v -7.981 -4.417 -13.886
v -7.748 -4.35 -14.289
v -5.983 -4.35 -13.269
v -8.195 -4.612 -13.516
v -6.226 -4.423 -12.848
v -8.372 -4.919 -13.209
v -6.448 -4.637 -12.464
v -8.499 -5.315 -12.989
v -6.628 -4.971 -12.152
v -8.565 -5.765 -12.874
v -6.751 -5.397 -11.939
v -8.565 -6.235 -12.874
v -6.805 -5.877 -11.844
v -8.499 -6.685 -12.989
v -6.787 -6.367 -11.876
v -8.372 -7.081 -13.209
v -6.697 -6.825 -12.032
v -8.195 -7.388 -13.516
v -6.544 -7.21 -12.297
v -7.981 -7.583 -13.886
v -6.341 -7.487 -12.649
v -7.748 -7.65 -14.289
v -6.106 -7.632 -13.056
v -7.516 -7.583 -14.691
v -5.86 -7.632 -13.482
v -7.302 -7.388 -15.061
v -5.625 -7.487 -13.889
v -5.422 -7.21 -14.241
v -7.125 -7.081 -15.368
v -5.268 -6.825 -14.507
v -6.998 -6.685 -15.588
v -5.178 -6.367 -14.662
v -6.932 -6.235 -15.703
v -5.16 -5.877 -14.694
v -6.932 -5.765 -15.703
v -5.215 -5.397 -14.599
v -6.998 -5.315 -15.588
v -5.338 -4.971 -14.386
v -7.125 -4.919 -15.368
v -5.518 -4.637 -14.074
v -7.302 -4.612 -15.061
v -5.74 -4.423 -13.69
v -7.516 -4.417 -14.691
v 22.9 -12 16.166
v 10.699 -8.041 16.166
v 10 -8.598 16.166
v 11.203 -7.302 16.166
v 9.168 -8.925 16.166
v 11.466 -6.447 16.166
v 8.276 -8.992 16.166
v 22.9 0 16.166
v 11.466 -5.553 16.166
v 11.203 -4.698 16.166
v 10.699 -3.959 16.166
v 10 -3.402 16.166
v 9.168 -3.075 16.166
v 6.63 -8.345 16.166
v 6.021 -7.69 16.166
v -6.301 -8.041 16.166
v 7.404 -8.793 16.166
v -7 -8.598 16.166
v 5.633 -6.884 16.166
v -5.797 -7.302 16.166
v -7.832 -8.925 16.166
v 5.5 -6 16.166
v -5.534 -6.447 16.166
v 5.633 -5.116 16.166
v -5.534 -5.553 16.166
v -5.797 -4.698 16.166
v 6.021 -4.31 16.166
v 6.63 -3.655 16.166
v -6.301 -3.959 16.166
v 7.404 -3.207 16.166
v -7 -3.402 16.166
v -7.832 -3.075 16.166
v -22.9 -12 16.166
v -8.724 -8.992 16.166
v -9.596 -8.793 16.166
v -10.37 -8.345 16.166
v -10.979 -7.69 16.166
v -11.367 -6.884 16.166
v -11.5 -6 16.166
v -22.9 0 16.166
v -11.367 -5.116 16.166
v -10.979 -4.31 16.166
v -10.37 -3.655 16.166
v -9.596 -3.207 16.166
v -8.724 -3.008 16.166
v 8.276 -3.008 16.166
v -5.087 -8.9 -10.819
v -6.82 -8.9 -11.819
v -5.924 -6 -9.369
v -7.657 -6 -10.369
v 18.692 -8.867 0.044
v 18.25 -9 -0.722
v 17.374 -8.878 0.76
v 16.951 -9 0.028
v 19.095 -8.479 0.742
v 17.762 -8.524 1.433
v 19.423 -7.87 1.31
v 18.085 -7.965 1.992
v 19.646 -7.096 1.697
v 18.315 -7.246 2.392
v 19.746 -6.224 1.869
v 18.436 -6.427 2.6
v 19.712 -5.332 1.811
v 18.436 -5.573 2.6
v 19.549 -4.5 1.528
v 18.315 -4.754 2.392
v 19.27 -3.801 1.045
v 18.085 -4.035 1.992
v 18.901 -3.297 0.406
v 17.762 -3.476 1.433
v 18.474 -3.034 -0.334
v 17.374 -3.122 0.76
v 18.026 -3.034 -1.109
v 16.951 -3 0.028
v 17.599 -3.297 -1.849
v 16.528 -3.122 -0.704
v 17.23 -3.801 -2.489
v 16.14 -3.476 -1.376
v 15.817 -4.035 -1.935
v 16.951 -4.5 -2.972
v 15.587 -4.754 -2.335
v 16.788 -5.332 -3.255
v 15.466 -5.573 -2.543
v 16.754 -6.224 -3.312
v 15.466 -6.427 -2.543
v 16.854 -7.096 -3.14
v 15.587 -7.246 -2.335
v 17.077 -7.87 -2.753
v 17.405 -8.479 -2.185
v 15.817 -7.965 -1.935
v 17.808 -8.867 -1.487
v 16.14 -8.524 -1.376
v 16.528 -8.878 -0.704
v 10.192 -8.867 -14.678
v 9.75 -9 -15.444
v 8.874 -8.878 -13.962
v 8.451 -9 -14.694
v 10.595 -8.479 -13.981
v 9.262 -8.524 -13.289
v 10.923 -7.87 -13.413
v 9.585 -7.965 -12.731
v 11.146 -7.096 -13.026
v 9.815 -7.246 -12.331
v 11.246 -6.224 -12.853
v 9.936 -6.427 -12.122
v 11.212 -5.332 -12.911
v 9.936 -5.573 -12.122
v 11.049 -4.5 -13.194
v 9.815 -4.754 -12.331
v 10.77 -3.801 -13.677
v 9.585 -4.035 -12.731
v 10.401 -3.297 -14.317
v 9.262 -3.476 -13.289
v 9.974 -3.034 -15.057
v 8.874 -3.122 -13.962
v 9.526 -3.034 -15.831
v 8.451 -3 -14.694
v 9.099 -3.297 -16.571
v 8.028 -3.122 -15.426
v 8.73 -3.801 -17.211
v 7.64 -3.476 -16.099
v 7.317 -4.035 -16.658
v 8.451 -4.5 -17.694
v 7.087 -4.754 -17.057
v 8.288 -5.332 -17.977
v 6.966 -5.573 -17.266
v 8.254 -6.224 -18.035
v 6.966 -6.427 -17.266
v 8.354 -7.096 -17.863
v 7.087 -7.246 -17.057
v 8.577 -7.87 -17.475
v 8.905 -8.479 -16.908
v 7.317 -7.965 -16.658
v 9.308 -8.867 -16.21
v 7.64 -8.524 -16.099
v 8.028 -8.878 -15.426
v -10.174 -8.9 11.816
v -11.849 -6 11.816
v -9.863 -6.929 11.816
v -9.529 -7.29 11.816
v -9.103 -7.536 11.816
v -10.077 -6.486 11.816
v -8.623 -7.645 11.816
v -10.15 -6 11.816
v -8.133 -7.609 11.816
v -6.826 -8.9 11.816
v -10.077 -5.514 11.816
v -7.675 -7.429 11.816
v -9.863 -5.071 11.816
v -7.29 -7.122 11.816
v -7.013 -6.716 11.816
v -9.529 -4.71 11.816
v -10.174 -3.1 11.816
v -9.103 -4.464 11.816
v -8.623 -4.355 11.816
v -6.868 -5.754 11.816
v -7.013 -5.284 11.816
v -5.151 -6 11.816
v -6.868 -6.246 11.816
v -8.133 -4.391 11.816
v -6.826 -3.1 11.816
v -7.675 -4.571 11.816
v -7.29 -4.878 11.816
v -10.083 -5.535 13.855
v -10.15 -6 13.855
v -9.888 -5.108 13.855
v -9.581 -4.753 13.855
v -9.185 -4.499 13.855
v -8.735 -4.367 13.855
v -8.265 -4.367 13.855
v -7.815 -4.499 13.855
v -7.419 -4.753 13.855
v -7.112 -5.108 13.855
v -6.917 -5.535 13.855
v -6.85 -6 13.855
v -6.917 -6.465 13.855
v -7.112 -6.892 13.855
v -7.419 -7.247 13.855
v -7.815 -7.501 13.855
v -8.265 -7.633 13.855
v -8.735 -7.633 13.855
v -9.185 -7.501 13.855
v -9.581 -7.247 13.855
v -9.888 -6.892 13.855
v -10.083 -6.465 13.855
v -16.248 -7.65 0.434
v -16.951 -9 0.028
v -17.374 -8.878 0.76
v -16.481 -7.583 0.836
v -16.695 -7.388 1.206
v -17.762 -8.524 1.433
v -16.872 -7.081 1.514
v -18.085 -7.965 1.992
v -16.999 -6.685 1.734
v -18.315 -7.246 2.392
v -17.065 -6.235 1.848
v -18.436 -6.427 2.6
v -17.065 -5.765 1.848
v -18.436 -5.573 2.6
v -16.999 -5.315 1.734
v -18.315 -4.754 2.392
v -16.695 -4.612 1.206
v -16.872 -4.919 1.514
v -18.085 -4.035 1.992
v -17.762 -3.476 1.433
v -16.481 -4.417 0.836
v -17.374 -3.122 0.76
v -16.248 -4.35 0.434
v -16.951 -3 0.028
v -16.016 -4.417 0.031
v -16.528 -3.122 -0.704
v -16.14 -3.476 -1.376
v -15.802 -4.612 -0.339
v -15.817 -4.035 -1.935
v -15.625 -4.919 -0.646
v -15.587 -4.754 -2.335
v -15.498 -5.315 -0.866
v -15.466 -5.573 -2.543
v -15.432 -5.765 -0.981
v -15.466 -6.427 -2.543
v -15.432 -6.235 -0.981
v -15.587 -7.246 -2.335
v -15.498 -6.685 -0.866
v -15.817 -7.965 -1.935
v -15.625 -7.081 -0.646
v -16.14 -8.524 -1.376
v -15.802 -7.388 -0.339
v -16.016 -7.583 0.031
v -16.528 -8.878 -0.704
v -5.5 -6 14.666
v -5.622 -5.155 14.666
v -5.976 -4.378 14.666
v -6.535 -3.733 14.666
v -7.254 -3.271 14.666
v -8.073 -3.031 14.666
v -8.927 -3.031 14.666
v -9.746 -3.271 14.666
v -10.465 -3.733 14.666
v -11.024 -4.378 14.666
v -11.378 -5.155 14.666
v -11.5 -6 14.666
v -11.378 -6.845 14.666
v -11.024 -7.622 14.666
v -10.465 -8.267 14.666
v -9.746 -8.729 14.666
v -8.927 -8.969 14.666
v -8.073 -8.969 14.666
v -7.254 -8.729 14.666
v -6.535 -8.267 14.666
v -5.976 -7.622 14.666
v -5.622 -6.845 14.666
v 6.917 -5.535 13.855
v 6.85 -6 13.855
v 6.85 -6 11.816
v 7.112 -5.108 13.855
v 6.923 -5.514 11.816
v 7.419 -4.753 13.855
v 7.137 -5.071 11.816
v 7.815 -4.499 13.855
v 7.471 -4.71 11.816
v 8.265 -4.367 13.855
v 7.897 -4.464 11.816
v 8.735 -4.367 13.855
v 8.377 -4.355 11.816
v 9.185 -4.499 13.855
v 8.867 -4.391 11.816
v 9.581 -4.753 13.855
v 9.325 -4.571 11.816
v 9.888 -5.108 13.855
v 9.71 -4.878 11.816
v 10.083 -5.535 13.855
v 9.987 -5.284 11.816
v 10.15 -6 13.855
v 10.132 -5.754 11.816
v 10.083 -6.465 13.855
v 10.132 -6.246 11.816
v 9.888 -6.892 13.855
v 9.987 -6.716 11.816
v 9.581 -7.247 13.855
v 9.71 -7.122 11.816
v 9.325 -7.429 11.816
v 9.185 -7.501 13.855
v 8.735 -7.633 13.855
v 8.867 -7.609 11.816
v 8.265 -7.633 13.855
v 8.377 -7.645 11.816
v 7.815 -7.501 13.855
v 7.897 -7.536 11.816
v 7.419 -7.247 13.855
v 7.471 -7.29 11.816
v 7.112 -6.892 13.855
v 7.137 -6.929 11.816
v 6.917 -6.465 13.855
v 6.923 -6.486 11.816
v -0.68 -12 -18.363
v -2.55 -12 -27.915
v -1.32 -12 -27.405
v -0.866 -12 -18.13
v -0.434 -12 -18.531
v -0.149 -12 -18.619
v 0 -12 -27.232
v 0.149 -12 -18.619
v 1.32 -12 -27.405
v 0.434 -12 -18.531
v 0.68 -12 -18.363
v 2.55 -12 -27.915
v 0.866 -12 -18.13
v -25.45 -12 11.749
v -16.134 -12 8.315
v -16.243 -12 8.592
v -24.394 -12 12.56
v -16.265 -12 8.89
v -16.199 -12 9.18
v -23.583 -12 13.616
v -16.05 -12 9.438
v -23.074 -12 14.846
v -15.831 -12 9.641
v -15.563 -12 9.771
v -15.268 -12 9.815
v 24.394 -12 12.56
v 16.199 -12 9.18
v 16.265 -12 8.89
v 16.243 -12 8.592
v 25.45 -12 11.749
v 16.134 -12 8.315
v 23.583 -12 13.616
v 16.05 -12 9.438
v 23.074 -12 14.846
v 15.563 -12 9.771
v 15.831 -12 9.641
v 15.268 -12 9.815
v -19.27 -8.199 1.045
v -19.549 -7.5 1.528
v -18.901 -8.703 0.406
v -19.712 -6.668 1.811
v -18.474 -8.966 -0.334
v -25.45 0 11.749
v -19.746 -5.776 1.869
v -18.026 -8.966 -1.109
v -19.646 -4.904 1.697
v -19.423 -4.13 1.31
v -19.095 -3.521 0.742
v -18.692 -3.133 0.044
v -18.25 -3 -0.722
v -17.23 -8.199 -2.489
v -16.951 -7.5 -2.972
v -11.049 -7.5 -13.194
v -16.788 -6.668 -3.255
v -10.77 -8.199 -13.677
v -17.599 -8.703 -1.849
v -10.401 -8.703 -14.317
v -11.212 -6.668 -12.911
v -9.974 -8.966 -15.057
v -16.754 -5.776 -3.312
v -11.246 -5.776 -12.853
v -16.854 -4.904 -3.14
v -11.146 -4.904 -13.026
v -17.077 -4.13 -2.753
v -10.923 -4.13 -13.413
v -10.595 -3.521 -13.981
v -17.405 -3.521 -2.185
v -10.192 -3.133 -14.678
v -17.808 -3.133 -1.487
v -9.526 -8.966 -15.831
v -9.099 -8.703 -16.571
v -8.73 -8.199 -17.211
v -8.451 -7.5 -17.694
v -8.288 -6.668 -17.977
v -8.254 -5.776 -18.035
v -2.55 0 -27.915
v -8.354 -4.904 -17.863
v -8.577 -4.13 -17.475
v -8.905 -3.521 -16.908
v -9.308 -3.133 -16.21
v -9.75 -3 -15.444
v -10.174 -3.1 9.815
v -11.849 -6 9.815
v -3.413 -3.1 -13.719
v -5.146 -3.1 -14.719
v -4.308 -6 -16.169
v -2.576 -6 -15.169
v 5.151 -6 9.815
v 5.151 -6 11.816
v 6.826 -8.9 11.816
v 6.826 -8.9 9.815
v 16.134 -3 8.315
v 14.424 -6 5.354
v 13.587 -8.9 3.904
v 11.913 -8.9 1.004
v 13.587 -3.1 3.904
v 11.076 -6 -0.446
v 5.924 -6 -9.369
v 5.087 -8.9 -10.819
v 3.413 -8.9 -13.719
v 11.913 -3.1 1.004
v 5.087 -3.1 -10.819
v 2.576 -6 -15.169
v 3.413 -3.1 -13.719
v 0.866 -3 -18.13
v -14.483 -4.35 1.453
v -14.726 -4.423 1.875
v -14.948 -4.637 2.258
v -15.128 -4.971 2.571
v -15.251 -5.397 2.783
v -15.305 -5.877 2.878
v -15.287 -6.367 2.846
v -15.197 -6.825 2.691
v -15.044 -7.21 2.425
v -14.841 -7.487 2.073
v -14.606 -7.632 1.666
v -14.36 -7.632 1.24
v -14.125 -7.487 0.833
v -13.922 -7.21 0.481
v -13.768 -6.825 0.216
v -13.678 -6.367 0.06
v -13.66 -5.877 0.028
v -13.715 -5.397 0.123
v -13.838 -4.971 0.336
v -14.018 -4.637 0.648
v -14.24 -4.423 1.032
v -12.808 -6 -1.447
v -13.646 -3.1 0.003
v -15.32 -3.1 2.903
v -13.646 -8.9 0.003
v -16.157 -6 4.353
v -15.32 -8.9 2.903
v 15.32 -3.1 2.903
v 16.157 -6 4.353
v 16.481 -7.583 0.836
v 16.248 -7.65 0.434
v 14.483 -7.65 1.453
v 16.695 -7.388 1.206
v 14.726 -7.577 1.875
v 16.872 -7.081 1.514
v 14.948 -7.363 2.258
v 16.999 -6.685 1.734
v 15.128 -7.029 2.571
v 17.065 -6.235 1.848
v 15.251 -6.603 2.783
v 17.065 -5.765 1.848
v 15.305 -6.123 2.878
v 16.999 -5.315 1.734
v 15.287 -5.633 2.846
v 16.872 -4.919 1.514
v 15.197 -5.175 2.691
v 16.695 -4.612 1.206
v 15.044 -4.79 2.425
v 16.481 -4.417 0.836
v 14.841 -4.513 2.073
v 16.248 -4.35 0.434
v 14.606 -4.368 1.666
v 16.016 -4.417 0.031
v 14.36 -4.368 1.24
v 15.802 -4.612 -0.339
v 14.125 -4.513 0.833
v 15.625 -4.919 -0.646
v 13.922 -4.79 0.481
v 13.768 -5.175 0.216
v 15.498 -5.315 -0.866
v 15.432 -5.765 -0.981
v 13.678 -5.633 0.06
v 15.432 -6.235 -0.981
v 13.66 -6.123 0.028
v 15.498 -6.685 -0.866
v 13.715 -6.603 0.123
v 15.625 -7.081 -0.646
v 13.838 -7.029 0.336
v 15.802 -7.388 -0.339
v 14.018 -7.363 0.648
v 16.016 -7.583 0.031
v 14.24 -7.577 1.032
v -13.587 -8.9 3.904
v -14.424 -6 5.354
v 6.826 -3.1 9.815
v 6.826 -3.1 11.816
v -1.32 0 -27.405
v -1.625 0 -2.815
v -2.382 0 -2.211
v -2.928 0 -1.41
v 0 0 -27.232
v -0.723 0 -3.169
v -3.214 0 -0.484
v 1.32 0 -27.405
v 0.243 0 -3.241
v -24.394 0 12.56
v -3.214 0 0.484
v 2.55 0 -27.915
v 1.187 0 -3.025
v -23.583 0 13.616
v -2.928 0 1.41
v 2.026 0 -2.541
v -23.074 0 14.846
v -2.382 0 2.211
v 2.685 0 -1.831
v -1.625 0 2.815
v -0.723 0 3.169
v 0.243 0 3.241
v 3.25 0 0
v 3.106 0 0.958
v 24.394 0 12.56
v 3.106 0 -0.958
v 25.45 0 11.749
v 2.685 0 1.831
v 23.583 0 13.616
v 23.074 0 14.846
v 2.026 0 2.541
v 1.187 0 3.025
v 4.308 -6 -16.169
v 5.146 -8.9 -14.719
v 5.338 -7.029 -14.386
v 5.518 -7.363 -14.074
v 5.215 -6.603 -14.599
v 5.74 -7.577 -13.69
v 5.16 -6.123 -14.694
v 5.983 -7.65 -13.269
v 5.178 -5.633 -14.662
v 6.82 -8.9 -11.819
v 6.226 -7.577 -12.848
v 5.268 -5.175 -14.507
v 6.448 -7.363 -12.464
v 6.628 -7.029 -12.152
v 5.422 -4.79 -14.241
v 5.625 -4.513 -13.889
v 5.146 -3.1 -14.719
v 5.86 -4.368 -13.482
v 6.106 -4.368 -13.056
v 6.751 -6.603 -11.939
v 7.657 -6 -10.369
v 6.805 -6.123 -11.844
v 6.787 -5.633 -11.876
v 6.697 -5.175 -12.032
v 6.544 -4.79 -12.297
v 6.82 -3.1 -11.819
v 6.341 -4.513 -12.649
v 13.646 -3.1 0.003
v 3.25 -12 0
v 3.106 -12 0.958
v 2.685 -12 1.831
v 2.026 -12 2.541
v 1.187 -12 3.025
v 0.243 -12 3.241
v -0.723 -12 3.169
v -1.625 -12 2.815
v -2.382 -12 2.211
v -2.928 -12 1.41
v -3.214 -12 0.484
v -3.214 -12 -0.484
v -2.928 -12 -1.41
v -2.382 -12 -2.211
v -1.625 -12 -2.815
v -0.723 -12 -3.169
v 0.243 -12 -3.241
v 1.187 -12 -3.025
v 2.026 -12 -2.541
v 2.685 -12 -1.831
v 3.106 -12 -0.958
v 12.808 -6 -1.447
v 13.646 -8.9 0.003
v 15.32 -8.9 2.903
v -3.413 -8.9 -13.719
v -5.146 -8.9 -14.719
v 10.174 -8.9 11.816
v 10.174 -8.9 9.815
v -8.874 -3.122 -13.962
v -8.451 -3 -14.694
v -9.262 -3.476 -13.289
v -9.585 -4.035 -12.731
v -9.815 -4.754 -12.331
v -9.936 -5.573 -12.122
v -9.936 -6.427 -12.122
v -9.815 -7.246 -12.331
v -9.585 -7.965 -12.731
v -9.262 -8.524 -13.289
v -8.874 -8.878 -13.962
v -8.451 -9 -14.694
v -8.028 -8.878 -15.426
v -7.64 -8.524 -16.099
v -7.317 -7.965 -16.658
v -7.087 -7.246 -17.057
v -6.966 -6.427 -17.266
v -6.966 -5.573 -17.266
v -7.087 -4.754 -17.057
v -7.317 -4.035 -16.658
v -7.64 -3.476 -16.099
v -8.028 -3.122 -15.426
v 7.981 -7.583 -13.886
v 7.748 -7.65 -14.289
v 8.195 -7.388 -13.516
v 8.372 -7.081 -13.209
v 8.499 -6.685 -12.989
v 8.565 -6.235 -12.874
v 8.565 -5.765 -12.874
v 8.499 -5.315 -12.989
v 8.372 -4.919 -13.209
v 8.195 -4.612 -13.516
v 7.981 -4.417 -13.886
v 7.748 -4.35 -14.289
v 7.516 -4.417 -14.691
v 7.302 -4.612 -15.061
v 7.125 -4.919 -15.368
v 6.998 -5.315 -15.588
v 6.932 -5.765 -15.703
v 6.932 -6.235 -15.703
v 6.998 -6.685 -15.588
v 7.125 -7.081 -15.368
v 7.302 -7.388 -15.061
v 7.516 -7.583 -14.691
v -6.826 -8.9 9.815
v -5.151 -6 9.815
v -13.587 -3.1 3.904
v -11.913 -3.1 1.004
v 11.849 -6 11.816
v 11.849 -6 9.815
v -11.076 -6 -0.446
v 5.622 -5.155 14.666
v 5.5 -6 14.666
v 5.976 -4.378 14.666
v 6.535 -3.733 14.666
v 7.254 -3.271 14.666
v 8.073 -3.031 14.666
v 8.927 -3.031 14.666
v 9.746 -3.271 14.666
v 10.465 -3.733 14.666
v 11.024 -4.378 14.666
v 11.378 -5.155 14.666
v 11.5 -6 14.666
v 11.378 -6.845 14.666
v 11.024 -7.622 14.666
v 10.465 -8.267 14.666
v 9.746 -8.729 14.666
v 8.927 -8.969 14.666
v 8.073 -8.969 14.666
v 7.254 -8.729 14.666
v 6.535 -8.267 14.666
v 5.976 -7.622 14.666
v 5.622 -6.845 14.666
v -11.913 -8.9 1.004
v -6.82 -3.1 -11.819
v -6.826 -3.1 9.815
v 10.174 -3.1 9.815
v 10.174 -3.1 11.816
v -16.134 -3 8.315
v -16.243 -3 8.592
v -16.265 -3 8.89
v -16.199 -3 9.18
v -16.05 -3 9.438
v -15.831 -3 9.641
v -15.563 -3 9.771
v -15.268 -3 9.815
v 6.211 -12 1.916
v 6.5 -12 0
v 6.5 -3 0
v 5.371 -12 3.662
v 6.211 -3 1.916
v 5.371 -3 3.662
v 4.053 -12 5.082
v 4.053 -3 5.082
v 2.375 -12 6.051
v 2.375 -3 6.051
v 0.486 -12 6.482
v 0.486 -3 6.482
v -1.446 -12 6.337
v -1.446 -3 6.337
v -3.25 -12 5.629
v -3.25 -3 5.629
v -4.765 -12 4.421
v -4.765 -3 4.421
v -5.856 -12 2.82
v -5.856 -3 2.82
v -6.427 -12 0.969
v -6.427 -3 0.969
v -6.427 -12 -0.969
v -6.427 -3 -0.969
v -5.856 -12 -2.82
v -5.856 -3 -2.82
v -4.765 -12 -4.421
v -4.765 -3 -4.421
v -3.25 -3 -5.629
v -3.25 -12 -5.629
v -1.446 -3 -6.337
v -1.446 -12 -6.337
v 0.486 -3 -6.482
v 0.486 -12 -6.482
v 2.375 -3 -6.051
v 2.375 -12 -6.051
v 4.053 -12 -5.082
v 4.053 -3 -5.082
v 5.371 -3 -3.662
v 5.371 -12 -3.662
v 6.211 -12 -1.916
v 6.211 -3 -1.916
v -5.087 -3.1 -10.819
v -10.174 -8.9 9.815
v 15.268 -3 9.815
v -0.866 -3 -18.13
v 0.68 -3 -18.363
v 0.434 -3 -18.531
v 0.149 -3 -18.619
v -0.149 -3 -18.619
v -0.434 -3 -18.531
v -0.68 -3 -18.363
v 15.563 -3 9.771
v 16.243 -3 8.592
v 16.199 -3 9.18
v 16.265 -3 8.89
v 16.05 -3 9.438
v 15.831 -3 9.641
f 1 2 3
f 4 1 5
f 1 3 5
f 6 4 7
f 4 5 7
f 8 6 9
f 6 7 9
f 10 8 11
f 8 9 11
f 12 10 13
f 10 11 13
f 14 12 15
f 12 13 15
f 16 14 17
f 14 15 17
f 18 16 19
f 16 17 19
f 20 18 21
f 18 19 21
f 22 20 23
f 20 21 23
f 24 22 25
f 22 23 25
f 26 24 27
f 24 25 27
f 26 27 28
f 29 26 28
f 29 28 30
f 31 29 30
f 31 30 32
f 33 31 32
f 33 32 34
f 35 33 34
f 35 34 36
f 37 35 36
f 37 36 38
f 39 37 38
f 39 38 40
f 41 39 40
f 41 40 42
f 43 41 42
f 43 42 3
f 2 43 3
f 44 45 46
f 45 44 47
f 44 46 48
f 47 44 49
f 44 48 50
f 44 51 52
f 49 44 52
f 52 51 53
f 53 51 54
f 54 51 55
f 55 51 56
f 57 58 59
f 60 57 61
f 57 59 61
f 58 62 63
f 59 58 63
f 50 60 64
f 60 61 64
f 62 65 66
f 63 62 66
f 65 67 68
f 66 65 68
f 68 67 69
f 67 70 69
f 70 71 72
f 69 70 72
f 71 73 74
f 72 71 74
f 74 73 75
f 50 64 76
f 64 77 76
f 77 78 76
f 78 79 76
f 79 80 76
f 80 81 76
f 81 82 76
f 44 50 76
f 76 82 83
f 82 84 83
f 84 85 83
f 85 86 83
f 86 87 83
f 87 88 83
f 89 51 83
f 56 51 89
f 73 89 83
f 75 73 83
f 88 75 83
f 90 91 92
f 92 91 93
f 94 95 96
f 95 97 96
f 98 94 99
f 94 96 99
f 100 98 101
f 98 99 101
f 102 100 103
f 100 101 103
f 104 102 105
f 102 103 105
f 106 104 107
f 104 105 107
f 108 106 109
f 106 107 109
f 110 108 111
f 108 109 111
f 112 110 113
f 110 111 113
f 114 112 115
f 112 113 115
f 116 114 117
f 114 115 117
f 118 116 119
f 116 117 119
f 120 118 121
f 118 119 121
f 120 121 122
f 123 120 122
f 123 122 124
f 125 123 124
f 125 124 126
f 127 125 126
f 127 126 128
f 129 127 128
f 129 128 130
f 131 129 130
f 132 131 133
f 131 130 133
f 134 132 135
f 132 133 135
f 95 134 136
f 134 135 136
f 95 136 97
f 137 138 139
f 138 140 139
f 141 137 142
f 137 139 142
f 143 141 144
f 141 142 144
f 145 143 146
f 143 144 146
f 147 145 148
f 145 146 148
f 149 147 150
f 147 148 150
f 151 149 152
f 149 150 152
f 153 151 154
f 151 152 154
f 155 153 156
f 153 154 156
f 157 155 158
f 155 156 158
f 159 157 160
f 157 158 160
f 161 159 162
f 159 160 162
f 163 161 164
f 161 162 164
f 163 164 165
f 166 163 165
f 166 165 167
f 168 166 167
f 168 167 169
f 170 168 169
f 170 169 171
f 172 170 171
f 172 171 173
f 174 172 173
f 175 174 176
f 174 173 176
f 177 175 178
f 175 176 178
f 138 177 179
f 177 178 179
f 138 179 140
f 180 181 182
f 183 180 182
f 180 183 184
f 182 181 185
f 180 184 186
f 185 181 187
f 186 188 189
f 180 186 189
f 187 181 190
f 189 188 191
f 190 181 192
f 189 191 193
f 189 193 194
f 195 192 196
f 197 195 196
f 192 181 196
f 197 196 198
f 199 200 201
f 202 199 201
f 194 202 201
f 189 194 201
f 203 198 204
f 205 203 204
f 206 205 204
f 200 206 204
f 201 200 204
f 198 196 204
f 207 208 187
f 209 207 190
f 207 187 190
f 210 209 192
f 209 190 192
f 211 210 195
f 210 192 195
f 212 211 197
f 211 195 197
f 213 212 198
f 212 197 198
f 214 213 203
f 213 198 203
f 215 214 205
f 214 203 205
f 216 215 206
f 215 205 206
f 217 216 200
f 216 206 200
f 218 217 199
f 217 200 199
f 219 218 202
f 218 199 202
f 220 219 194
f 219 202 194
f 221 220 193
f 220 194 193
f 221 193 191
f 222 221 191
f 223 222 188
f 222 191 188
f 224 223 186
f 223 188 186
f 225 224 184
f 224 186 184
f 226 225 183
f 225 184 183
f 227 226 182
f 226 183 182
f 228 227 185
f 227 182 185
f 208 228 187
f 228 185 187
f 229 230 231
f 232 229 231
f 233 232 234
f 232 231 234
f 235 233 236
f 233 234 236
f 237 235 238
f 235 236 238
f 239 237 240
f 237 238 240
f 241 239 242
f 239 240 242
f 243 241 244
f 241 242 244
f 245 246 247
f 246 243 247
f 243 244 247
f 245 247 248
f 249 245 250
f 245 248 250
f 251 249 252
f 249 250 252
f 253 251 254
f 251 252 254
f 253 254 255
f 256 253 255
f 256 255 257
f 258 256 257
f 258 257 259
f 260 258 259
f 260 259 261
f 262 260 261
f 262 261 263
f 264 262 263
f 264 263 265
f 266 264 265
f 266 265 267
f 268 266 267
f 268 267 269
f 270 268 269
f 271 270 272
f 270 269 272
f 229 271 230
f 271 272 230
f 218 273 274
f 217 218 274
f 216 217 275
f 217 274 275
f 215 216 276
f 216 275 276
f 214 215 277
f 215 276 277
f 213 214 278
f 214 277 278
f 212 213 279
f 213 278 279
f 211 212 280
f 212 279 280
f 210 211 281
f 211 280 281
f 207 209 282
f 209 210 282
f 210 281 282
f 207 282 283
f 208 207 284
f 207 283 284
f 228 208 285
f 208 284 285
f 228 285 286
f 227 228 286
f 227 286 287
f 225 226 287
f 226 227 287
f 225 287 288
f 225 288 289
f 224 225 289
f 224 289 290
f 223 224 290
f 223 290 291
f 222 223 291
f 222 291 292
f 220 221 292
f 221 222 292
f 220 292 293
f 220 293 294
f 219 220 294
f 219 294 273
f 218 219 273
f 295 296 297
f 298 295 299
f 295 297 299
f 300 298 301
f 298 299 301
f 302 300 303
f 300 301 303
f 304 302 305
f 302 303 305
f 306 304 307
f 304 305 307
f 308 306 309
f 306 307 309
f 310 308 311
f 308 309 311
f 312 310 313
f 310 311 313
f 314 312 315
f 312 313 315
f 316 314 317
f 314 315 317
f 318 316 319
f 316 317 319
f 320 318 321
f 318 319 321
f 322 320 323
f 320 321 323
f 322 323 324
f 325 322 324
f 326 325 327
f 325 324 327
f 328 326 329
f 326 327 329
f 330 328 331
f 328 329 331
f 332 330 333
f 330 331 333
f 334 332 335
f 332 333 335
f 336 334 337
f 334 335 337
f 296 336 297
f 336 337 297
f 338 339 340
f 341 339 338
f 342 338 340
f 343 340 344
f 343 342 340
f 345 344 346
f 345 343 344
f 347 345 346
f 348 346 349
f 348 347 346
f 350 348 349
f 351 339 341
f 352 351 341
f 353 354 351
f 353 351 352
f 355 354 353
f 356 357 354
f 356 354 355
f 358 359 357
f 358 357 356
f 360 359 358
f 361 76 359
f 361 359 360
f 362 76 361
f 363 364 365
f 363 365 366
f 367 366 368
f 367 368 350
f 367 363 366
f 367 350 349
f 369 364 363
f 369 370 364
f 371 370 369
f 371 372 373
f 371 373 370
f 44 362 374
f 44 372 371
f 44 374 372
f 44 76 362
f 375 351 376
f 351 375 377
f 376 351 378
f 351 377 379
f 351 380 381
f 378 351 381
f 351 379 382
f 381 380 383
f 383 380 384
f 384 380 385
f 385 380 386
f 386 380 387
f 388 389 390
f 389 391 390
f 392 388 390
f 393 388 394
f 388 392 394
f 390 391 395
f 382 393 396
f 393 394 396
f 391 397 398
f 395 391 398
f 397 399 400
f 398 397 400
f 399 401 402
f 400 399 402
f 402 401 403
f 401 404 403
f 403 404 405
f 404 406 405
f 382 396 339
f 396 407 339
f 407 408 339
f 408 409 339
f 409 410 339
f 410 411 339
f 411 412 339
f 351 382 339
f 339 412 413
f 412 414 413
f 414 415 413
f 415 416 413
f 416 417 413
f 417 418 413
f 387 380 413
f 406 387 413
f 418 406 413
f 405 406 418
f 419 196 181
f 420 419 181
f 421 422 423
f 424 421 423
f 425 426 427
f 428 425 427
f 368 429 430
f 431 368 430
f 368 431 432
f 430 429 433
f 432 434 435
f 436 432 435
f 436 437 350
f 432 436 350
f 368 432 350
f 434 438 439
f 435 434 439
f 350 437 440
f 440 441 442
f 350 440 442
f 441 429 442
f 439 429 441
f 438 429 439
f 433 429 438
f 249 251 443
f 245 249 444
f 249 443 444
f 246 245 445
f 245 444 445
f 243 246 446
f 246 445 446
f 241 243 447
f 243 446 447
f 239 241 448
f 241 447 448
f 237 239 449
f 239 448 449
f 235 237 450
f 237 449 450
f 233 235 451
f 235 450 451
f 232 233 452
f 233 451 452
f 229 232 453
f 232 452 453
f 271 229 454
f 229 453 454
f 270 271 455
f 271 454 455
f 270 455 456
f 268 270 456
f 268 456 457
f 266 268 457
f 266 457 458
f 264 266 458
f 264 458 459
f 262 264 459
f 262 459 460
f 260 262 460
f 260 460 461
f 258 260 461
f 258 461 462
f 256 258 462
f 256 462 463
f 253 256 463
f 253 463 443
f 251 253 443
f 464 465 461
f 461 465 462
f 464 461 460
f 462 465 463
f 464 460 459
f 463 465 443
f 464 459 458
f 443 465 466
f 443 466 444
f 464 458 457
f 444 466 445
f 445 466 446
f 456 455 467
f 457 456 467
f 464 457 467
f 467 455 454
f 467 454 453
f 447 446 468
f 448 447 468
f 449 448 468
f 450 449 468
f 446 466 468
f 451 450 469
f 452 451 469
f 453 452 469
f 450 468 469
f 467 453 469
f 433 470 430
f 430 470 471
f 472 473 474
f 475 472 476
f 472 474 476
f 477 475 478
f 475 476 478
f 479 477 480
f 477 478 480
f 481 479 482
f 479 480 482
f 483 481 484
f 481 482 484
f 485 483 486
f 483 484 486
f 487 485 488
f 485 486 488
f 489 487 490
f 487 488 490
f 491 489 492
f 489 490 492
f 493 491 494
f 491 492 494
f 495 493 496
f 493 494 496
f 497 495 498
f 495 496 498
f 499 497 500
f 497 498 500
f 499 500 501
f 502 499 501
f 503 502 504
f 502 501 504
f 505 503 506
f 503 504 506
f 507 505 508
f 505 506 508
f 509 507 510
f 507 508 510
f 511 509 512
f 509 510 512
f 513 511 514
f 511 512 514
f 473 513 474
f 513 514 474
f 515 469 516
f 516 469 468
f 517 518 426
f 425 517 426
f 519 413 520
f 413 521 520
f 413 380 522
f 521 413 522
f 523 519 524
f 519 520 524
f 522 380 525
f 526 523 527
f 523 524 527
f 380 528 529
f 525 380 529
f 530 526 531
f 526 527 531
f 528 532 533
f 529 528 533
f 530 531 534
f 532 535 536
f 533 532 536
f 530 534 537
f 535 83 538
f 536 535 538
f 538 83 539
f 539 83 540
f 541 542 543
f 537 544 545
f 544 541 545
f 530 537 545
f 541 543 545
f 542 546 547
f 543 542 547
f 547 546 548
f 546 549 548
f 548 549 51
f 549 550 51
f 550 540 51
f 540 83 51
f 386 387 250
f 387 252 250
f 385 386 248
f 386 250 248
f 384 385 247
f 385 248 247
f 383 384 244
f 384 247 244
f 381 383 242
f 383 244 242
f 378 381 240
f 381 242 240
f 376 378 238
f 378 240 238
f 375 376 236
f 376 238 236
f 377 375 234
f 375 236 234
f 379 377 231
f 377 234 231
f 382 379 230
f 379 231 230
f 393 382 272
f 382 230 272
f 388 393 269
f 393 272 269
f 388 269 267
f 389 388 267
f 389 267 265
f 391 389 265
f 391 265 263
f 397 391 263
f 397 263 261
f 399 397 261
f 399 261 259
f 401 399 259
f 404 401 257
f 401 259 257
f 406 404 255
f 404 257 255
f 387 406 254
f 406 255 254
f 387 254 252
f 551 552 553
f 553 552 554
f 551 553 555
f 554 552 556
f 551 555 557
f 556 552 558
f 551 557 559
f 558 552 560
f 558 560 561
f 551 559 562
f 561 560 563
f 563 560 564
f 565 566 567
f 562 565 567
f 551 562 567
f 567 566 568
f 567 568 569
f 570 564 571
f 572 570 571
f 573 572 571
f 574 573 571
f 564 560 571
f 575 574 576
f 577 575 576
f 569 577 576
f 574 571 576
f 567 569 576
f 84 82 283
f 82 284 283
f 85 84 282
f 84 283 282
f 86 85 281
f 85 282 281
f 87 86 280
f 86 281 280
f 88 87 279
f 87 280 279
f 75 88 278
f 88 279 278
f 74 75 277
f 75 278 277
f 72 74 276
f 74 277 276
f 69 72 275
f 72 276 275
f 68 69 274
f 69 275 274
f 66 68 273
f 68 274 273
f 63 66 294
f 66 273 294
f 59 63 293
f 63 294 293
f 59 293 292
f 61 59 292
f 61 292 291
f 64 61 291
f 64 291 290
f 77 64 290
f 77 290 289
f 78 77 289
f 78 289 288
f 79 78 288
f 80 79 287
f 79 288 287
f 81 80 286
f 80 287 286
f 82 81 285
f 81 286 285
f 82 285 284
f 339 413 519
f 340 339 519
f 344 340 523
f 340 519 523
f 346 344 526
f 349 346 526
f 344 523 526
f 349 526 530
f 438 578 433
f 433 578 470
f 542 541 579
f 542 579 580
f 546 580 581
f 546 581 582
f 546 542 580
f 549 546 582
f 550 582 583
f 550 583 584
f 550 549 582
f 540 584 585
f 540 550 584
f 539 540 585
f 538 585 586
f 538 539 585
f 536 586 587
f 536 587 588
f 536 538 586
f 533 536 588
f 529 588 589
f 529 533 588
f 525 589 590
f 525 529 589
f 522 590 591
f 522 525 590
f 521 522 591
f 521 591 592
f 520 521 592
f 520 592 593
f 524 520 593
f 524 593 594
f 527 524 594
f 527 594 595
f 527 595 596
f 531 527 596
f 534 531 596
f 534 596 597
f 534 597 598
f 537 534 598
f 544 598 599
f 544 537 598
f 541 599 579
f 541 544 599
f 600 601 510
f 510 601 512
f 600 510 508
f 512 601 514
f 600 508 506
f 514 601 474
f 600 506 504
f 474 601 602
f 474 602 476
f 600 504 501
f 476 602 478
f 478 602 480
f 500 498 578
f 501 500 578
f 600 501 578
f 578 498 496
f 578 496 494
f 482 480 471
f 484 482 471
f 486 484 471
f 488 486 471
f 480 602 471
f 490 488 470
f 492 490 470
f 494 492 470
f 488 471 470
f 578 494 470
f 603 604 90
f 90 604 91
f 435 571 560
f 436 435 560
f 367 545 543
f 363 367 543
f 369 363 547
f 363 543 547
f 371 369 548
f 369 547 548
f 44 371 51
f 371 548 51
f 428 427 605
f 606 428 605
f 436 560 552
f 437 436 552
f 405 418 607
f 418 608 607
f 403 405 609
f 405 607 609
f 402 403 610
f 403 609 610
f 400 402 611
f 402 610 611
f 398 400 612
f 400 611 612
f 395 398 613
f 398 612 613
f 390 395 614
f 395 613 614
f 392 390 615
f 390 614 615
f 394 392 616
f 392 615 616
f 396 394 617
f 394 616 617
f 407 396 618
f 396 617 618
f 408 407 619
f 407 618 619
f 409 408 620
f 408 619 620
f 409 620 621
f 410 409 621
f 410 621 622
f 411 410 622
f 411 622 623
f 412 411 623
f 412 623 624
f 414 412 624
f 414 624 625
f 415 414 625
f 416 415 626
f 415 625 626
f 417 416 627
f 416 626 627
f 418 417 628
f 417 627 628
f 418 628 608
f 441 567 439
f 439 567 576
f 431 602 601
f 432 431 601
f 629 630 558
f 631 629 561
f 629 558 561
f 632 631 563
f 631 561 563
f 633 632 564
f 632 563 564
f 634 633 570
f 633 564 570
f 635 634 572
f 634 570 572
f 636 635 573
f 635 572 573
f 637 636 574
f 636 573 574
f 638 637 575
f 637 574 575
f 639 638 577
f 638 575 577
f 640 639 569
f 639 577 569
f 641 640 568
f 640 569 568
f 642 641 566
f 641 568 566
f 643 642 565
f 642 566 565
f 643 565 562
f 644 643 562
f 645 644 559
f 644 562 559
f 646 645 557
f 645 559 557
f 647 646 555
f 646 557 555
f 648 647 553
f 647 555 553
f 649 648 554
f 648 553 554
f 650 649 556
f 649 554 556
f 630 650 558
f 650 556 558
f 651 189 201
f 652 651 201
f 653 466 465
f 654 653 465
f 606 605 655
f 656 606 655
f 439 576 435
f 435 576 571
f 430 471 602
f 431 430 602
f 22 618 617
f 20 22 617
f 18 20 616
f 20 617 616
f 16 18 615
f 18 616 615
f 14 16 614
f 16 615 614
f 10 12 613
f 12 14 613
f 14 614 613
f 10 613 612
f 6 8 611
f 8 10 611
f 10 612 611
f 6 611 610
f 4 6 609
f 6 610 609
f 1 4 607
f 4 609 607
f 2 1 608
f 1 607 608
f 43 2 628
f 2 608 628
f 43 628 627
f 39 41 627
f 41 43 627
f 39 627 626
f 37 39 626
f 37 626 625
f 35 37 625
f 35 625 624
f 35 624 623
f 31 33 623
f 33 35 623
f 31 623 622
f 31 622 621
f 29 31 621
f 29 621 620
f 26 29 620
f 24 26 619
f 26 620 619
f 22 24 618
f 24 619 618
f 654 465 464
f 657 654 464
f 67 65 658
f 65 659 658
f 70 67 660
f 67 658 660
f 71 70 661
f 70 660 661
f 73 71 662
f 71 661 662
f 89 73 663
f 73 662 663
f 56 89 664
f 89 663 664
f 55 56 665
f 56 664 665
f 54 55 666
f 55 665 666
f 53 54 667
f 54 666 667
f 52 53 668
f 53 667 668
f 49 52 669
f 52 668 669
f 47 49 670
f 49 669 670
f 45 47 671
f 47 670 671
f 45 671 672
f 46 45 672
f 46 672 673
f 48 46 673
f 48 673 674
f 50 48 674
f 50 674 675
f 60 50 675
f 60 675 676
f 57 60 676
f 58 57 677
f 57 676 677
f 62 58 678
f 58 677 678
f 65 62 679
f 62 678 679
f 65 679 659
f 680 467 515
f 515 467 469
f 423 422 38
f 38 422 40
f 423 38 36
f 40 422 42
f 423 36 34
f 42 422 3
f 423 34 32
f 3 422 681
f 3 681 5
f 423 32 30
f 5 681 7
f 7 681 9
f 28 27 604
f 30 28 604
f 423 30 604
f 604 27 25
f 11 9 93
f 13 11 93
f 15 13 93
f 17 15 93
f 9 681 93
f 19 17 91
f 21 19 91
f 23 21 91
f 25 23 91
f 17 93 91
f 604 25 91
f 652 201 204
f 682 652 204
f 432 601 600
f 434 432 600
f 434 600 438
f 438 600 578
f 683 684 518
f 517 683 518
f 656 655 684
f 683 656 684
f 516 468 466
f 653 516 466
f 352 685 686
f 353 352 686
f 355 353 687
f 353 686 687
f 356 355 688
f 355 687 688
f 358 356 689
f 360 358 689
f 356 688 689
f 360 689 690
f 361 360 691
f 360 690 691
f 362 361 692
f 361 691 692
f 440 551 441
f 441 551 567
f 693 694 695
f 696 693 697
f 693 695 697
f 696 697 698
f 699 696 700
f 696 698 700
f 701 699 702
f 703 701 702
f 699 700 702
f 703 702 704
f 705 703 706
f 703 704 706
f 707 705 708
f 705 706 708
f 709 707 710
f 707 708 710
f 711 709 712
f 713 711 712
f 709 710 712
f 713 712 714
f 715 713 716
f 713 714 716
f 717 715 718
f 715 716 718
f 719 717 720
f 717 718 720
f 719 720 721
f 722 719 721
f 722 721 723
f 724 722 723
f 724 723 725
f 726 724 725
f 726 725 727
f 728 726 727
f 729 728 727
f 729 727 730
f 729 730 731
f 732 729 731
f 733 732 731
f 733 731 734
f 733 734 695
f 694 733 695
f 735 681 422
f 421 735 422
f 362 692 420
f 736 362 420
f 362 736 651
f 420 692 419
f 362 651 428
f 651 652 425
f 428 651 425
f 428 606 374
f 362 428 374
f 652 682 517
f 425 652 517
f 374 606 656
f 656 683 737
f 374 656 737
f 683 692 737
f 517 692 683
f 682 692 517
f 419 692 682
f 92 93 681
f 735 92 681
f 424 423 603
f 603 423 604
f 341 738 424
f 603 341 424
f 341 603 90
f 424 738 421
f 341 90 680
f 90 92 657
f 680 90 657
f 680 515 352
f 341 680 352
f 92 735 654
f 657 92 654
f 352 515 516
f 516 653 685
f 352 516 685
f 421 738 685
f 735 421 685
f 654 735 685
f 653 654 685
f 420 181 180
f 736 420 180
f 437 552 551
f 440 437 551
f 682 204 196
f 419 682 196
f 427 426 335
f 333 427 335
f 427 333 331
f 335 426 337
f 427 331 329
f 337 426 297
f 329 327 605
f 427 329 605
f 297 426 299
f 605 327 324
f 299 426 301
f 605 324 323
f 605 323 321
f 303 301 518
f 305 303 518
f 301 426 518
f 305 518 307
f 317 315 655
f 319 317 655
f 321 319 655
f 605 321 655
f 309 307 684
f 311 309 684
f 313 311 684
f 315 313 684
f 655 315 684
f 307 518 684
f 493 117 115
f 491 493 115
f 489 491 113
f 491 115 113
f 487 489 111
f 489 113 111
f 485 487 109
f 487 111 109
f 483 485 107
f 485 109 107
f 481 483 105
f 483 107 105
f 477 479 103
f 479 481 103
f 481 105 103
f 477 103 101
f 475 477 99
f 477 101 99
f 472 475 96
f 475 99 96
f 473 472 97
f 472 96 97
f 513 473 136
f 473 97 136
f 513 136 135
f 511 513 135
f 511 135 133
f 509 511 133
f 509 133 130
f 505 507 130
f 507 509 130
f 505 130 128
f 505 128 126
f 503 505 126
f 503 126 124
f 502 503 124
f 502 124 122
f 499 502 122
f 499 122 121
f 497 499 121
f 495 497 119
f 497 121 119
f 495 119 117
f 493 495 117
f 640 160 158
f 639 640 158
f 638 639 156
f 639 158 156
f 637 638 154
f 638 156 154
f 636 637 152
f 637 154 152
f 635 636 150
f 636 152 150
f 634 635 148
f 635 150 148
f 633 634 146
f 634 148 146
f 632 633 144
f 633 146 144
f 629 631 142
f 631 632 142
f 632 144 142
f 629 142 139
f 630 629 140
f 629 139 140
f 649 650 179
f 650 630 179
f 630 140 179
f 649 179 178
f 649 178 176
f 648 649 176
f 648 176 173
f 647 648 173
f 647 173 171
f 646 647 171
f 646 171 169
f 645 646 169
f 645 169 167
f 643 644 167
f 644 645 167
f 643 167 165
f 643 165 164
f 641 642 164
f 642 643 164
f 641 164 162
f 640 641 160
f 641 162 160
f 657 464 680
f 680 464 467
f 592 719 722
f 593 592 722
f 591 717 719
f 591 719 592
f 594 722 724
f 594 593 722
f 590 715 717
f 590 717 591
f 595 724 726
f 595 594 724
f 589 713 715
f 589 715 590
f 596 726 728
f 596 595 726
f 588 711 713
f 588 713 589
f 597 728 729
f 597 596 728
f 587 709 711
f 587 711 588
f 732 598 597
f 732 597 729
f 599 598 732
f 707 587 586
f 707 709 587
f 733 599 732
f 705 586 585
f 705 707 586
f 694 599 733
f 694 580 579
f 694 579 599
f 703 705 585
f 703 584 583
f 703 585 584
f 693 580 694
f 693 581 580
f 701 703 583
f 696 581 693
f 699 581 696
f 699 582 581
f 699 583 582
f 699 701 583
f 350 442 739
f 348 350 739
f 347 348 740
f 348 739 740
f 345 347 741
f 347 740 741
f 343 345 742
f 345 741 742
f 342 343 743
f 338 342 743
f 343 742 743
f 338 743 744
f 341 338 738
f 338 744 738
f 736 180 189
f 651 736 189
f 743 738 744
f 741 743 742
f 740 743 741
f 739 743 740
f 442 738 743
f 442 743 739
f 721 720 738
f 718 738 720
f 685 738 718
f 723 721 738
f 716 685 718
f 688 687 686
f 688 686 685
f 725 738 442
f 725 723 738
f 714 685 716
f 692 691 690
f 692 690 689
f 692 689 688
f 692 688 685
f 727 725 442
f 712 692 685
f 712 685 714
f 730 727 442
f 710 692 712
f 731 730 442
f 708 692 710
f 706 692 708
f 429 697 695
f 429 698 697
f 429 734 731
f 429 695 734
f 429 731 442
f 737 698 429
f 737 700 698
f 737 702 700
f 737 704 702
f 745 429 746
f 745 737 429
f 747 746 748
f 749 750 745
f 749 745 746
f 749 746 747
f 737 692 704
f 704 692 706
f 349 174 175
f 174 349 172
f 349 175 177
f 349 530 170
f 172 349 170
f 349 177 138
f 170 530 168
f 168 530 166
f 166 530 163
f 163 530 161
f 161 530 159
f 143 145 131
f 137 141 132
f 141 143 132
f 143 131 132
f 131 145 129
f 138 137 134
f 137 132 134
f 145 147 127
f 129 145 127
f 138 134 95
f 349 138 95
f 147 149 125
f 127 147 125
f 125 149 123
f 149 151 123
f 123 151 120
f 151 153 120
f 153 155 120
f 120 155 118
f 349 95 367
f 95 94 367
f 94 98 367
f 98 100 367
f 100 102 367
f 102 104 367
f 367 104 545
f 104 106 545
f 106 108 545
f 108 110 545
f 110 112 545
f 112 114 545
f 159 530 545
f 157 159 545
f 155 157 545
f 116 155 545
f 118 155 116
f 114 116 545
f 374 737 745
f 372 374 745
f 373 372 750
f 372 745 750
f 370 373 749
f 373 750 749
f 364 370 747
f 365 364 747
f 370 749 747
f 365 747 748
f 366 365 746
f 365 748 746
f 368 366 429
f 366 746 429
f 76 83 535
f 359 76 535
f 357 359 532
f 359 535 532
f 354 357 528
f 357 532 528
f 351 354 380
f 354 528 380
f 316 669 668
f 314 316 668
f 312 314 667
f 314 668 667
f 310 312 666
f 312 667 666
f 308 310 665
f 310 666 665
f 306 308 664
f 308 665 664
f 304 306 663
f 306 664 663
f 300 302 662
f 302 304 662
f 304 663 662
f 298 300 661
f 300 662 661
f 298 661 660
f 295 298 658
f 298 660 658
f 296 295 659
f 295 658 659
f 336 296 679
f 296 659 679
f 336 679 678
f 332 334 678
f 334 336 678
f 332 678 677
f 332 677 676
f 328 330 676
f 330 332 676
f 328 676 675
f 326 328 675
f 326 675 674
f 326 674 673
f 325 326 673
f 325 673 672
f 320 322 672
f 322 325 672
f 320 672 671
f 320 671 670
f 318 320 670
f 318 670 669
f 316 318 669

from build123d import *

# Parameters (mm, degrees)
F1_DEPTH  = 12
F0_R      = 6.5
F0_R_2    = 3.25
F2_DEPTH  = 3
F4_START  = -4.35
F4_DEPTH  = 3.65
F5_D      = 3.3
F5_DEPTH  = 8
F5_TIP    = 0.9914200214
F6_D      = 6
F6_DEPTH  = 1.5
F6_TIP    = 1.8025818571
F8_START  = -4.35
F8_DEPTH  = 3.65
F9_D      = 6
F9_DEPTH  = 1.5
F9_TIP    = 1.8025818571
F10_D     = 3.3
F10_DEPTH = 8
F10_START = 2.3111618
F10_TIP   = 0.9914200214
F12_START = -4.35
F12_DEPTH = 3.65
F13_D     = 3.3
F13_DEPTH = 8
F13_TIP   = 0.9914200214
F14_D     = 6
F14_DEPTH = 1.5
F14_TIP   = 1.8025818571


with BuildPart() as f1:
    # F0 (on Front) → F1 (new body)
    with BuildSketch(Plane.XZ):
        with BuildLine():
            ThreePointArc((25.45, 11.749077978), (23.5832704407, 13.6158075373), (22.9, 16.1658075373))
            Line((22.9, 16.1658075373), (-22.9, 16.1658075373))
            ThreePointArc((-22.9, 16.1658075373), (-23.5832704407, 13.6158075373), (-25.45, 11.749077978))
            Line((-25.45, 11.749077978), (-2.55, -27.9148855153))
            ThreePointArc((-2.55, -27.9148855153), (0, -27.2316150746), (2.55, -27.9148855153))
            Line((2.55, -27.9148855153), (25.45, 11.749077978))
        make_face()
        with BuildLine():
            ThreePointArc((15.2679491924, 9.8149545762), (16.1339745962, 9.3149545762), (16.1339745962, 8.3149545762))
            Line((16.1339745962, 8.3149545762), (0.8660254038, -18.1299091524))
            ThreePointArc((0.8660254038, -18.1299091524), (0, -18.6299091524), (-0.8660254038, -18.1299091524))
            Line((-0.8660254038, -18.1299091524), (-16.1339745962, 8.3149545762))
            ThreePointArc((-16.1339745962, 8.3149545762), (-16.1339745962, 9.3149545762), (-15.2679491924, 9.8149545762))
            Line((-15.2679491924, 9.8149545762), (15.2679491924, 9.8149545762))
        make_face(mode=Mode.SUBTRACT)
    extrude(amount=F1_DEPTH)



with BuildPart() as f1b:
    # F0 (on Front) → F1, piece 2 (new body)
    with BuildSketch(Plane.XZ):
        Circle(F0_R)
        Circle(F0_R_2, mode=Mode.SUBTRACT)
    extrude(amount=F1_DEPTH)


with BuildPart() as f1_1:
    add(f1.part)

    add(f1b.part)  # F2 merges F1b
    # F0 (on Front) → F2 (join)
    with BuildSketch(Plane.XZ):
        with BuildLine():
            Line((0.8660254038, -18.1299091524), (16.1339745962, 8.3149545762))
            ThreePointArc((16.1339745962, 8.3149545762), (16.1339745962, 9.3149545762), (15.2679491924, 9.8149545762))
            Line((15.2679491924, 9.8149545762), (-15.2679491924, 9.8149545762))
            ThreePointArc((-15.2679491924, 9.8149545762), (-16.1339745962, 9.3149545762), (-16.1339745962, 8.3149545762))
            Line((-16.1339745962, 8.3149545762), (-0.8660254038, -18.1299091524))
            ThreePointArc((-0.8660254038, -18.1299091524), (0, -18.6299091524), (0.8660254038, -18.1299091524))
        make_face()
        Circle(F0_R, mode=Mode.SUBTRACT)
    extrude(amount=F2_DEPTH)

    # F3 (on face) → F4 (cut)
    with BuildSketch(Plane.XY.offset(16.1658075373).offset(F4_START)):
        Polygon((-6.8256842194, -8.9), (-5.1513684387, -6), (-6.8256842194, -3.1), (-10.1743157806, -3.1), (-11.8486315613, -6), (-10.1743157806, -8.9), align=None)
        Polygon((10.1743157806, -8.9), (11.8486315613, -6), (10.1743157806, -3.1), (6.8256842194, -3.1), (5.1513684387, -6), (6.8256842194, -8.9), align=None)
    extrude(amount=-F4_DEPTH, mode=Mode.SUBTRACT)

    # F5
    with Locations(Plane.XY.offset(16.1658075373)):
        with Locations((8.5, -6), (-8.5, -6)):
            Hole(F5_D / 2, depth=F5_DEPTH)
            with Locations((0, 0, -(F5_DEPTH + F5_TIP / 2))):  # 118° drill point
                Cone(0, F5_D / 2, F5_TIP, mode=Mode.SUBTRACT)

    # F6
    with Locations(Plane.XY.offset(16.1658075373)):
        with Locations((8.5, -6), (-8.5, -6)):
            Hole(F6_D / 2, depth=F6_DEPTH)
            with Locations((0, 0, -(F6_DEPTH + F6_TIP / 2))):  # 118° drill point
                Cone(0, F6_D / 2, F6_TIP, mode=Mode.SUBTRACT)

    # F7 (on face) → F8 (cut)
    with BuildSketch(Plane(origin=(-14, 0, -8.0829037687), x_dir=(0, -1, 0), z_dir=(-0.8660254038, 0, -0.5)).offset(F8_START)):
        Polygon((3.1, 6.8256842194), (6, 5.1513684387), (8.9, 6.8256842194), (8.9, 10.1743157806), (6, 11.8486315613), (3.1, 10.1743157806), align=None)
        Polygon((3.1, -10.1743157806), (6, -11.8486315613), (8.9, -10.1743157806), (8.9, -6.8256842194), (6, -5.1513684387), (3.1, -6.8256842194), align=None)
    extrude(amount=-F8_DEPTH, mode=Mode.SUBTRACT)

    # F9
    with Locations(Plane(origin=(-14, 0, -8.0829037687), x_dir=(0, -1, 0), z_dir=(-0.8660254038, 0, -0.5))):
        with Locations((6, 8.5), (6, -8.5)):
            Hole(F9_D / 2, depth=F9_DEPTH)
            with Locations((0, 0, -(F9_DEPTH + F9_TIP / 2))):  # 118° drill point
                Cone(0, F9_D / 2, F9_TIP, mode=Mode.SUBTRACT)

    # F10
    # its depths count from where the whole tool has entered the part; down to there all is cleared
    with Locations(Plane(origin=(-14, 0, -8.0829037687), x_dir=(0, -1, 0), z_dir=(-0.8660254038, 0, -0.5)).offset(-F10_START)):
        with Locations((6, 8.5), (6, -8.5)):
            Hole(F10_D / 2, depth=F10_DEPTH)
            with Locations((0, 0, -(F10_DEPTH + F10_TIP / 2))):  # 118° drill point
                Cone(0, F10_D / 2, F10_TIP, mode=Mode.SUBTRACT)

    # F11 (on face) → F12 (cut)
    with BuildSketch(Plane(origin=(14, 0, -8.0829037687), x_dir=(0, 1, 0), z_dir=(0.8660254038, 0, -0.5)).offset(F12_START)):
        Polygon((-3.1, -6.8256842194), (-6, -5.1513684387), (-8.9, -6.8256842194), (-8.9, -10.1743157806), (-6, -11.8486315613), (-3.1, -10.1743157806), align=None)
        Polygon((-3.1, 6.8256842194), (-3.1, 10.1743157806), (-6, 11.8486315613), (-8.9, 10.1743157806), (-8.9, 6.8256842194), (-6, 5.1513684387), align=None)
    extrude(amount=-F12_DEPTH, mode=Mode.SUBTRACT)

    # F13
    with Locations(Plane(origin=(14, 0, -8.0829037687), x_dir=(0, 1, 0), z_dir=(0.8660254038, 0, -0.5))):
        with Locations((-6, -8.5), (-6, 8.5)):
            Hole(F13_D / 2, depth=F13_DEPTH)
            with Locations((0, 0, -(F13_DEPTH + F13_TIP / 2))):  # 118° drill point
                Cone(0, F13_D / 2, F13_TIP, mode=Mode.SUBTRACT)

    # F14
    with Locations(Plane(origin=(14, 0, -8.0829037687), x_dir=(0, 1, 0), z_dir=(0.8660254038, 0, -0.5))):
        with Locations((-6, -8.5), (-6, 8.5)):
            Hole(F14_D / 2, depth=F14_DEPTH)
            with Locations((0, 0, -(F14_DEPTH + F14_TIP / 2))):  # 118° drill point
                Cone(0, F14_D / 2, F14_TIP, mode=Mode.SUBTRACT)


solid = f1_1.part
